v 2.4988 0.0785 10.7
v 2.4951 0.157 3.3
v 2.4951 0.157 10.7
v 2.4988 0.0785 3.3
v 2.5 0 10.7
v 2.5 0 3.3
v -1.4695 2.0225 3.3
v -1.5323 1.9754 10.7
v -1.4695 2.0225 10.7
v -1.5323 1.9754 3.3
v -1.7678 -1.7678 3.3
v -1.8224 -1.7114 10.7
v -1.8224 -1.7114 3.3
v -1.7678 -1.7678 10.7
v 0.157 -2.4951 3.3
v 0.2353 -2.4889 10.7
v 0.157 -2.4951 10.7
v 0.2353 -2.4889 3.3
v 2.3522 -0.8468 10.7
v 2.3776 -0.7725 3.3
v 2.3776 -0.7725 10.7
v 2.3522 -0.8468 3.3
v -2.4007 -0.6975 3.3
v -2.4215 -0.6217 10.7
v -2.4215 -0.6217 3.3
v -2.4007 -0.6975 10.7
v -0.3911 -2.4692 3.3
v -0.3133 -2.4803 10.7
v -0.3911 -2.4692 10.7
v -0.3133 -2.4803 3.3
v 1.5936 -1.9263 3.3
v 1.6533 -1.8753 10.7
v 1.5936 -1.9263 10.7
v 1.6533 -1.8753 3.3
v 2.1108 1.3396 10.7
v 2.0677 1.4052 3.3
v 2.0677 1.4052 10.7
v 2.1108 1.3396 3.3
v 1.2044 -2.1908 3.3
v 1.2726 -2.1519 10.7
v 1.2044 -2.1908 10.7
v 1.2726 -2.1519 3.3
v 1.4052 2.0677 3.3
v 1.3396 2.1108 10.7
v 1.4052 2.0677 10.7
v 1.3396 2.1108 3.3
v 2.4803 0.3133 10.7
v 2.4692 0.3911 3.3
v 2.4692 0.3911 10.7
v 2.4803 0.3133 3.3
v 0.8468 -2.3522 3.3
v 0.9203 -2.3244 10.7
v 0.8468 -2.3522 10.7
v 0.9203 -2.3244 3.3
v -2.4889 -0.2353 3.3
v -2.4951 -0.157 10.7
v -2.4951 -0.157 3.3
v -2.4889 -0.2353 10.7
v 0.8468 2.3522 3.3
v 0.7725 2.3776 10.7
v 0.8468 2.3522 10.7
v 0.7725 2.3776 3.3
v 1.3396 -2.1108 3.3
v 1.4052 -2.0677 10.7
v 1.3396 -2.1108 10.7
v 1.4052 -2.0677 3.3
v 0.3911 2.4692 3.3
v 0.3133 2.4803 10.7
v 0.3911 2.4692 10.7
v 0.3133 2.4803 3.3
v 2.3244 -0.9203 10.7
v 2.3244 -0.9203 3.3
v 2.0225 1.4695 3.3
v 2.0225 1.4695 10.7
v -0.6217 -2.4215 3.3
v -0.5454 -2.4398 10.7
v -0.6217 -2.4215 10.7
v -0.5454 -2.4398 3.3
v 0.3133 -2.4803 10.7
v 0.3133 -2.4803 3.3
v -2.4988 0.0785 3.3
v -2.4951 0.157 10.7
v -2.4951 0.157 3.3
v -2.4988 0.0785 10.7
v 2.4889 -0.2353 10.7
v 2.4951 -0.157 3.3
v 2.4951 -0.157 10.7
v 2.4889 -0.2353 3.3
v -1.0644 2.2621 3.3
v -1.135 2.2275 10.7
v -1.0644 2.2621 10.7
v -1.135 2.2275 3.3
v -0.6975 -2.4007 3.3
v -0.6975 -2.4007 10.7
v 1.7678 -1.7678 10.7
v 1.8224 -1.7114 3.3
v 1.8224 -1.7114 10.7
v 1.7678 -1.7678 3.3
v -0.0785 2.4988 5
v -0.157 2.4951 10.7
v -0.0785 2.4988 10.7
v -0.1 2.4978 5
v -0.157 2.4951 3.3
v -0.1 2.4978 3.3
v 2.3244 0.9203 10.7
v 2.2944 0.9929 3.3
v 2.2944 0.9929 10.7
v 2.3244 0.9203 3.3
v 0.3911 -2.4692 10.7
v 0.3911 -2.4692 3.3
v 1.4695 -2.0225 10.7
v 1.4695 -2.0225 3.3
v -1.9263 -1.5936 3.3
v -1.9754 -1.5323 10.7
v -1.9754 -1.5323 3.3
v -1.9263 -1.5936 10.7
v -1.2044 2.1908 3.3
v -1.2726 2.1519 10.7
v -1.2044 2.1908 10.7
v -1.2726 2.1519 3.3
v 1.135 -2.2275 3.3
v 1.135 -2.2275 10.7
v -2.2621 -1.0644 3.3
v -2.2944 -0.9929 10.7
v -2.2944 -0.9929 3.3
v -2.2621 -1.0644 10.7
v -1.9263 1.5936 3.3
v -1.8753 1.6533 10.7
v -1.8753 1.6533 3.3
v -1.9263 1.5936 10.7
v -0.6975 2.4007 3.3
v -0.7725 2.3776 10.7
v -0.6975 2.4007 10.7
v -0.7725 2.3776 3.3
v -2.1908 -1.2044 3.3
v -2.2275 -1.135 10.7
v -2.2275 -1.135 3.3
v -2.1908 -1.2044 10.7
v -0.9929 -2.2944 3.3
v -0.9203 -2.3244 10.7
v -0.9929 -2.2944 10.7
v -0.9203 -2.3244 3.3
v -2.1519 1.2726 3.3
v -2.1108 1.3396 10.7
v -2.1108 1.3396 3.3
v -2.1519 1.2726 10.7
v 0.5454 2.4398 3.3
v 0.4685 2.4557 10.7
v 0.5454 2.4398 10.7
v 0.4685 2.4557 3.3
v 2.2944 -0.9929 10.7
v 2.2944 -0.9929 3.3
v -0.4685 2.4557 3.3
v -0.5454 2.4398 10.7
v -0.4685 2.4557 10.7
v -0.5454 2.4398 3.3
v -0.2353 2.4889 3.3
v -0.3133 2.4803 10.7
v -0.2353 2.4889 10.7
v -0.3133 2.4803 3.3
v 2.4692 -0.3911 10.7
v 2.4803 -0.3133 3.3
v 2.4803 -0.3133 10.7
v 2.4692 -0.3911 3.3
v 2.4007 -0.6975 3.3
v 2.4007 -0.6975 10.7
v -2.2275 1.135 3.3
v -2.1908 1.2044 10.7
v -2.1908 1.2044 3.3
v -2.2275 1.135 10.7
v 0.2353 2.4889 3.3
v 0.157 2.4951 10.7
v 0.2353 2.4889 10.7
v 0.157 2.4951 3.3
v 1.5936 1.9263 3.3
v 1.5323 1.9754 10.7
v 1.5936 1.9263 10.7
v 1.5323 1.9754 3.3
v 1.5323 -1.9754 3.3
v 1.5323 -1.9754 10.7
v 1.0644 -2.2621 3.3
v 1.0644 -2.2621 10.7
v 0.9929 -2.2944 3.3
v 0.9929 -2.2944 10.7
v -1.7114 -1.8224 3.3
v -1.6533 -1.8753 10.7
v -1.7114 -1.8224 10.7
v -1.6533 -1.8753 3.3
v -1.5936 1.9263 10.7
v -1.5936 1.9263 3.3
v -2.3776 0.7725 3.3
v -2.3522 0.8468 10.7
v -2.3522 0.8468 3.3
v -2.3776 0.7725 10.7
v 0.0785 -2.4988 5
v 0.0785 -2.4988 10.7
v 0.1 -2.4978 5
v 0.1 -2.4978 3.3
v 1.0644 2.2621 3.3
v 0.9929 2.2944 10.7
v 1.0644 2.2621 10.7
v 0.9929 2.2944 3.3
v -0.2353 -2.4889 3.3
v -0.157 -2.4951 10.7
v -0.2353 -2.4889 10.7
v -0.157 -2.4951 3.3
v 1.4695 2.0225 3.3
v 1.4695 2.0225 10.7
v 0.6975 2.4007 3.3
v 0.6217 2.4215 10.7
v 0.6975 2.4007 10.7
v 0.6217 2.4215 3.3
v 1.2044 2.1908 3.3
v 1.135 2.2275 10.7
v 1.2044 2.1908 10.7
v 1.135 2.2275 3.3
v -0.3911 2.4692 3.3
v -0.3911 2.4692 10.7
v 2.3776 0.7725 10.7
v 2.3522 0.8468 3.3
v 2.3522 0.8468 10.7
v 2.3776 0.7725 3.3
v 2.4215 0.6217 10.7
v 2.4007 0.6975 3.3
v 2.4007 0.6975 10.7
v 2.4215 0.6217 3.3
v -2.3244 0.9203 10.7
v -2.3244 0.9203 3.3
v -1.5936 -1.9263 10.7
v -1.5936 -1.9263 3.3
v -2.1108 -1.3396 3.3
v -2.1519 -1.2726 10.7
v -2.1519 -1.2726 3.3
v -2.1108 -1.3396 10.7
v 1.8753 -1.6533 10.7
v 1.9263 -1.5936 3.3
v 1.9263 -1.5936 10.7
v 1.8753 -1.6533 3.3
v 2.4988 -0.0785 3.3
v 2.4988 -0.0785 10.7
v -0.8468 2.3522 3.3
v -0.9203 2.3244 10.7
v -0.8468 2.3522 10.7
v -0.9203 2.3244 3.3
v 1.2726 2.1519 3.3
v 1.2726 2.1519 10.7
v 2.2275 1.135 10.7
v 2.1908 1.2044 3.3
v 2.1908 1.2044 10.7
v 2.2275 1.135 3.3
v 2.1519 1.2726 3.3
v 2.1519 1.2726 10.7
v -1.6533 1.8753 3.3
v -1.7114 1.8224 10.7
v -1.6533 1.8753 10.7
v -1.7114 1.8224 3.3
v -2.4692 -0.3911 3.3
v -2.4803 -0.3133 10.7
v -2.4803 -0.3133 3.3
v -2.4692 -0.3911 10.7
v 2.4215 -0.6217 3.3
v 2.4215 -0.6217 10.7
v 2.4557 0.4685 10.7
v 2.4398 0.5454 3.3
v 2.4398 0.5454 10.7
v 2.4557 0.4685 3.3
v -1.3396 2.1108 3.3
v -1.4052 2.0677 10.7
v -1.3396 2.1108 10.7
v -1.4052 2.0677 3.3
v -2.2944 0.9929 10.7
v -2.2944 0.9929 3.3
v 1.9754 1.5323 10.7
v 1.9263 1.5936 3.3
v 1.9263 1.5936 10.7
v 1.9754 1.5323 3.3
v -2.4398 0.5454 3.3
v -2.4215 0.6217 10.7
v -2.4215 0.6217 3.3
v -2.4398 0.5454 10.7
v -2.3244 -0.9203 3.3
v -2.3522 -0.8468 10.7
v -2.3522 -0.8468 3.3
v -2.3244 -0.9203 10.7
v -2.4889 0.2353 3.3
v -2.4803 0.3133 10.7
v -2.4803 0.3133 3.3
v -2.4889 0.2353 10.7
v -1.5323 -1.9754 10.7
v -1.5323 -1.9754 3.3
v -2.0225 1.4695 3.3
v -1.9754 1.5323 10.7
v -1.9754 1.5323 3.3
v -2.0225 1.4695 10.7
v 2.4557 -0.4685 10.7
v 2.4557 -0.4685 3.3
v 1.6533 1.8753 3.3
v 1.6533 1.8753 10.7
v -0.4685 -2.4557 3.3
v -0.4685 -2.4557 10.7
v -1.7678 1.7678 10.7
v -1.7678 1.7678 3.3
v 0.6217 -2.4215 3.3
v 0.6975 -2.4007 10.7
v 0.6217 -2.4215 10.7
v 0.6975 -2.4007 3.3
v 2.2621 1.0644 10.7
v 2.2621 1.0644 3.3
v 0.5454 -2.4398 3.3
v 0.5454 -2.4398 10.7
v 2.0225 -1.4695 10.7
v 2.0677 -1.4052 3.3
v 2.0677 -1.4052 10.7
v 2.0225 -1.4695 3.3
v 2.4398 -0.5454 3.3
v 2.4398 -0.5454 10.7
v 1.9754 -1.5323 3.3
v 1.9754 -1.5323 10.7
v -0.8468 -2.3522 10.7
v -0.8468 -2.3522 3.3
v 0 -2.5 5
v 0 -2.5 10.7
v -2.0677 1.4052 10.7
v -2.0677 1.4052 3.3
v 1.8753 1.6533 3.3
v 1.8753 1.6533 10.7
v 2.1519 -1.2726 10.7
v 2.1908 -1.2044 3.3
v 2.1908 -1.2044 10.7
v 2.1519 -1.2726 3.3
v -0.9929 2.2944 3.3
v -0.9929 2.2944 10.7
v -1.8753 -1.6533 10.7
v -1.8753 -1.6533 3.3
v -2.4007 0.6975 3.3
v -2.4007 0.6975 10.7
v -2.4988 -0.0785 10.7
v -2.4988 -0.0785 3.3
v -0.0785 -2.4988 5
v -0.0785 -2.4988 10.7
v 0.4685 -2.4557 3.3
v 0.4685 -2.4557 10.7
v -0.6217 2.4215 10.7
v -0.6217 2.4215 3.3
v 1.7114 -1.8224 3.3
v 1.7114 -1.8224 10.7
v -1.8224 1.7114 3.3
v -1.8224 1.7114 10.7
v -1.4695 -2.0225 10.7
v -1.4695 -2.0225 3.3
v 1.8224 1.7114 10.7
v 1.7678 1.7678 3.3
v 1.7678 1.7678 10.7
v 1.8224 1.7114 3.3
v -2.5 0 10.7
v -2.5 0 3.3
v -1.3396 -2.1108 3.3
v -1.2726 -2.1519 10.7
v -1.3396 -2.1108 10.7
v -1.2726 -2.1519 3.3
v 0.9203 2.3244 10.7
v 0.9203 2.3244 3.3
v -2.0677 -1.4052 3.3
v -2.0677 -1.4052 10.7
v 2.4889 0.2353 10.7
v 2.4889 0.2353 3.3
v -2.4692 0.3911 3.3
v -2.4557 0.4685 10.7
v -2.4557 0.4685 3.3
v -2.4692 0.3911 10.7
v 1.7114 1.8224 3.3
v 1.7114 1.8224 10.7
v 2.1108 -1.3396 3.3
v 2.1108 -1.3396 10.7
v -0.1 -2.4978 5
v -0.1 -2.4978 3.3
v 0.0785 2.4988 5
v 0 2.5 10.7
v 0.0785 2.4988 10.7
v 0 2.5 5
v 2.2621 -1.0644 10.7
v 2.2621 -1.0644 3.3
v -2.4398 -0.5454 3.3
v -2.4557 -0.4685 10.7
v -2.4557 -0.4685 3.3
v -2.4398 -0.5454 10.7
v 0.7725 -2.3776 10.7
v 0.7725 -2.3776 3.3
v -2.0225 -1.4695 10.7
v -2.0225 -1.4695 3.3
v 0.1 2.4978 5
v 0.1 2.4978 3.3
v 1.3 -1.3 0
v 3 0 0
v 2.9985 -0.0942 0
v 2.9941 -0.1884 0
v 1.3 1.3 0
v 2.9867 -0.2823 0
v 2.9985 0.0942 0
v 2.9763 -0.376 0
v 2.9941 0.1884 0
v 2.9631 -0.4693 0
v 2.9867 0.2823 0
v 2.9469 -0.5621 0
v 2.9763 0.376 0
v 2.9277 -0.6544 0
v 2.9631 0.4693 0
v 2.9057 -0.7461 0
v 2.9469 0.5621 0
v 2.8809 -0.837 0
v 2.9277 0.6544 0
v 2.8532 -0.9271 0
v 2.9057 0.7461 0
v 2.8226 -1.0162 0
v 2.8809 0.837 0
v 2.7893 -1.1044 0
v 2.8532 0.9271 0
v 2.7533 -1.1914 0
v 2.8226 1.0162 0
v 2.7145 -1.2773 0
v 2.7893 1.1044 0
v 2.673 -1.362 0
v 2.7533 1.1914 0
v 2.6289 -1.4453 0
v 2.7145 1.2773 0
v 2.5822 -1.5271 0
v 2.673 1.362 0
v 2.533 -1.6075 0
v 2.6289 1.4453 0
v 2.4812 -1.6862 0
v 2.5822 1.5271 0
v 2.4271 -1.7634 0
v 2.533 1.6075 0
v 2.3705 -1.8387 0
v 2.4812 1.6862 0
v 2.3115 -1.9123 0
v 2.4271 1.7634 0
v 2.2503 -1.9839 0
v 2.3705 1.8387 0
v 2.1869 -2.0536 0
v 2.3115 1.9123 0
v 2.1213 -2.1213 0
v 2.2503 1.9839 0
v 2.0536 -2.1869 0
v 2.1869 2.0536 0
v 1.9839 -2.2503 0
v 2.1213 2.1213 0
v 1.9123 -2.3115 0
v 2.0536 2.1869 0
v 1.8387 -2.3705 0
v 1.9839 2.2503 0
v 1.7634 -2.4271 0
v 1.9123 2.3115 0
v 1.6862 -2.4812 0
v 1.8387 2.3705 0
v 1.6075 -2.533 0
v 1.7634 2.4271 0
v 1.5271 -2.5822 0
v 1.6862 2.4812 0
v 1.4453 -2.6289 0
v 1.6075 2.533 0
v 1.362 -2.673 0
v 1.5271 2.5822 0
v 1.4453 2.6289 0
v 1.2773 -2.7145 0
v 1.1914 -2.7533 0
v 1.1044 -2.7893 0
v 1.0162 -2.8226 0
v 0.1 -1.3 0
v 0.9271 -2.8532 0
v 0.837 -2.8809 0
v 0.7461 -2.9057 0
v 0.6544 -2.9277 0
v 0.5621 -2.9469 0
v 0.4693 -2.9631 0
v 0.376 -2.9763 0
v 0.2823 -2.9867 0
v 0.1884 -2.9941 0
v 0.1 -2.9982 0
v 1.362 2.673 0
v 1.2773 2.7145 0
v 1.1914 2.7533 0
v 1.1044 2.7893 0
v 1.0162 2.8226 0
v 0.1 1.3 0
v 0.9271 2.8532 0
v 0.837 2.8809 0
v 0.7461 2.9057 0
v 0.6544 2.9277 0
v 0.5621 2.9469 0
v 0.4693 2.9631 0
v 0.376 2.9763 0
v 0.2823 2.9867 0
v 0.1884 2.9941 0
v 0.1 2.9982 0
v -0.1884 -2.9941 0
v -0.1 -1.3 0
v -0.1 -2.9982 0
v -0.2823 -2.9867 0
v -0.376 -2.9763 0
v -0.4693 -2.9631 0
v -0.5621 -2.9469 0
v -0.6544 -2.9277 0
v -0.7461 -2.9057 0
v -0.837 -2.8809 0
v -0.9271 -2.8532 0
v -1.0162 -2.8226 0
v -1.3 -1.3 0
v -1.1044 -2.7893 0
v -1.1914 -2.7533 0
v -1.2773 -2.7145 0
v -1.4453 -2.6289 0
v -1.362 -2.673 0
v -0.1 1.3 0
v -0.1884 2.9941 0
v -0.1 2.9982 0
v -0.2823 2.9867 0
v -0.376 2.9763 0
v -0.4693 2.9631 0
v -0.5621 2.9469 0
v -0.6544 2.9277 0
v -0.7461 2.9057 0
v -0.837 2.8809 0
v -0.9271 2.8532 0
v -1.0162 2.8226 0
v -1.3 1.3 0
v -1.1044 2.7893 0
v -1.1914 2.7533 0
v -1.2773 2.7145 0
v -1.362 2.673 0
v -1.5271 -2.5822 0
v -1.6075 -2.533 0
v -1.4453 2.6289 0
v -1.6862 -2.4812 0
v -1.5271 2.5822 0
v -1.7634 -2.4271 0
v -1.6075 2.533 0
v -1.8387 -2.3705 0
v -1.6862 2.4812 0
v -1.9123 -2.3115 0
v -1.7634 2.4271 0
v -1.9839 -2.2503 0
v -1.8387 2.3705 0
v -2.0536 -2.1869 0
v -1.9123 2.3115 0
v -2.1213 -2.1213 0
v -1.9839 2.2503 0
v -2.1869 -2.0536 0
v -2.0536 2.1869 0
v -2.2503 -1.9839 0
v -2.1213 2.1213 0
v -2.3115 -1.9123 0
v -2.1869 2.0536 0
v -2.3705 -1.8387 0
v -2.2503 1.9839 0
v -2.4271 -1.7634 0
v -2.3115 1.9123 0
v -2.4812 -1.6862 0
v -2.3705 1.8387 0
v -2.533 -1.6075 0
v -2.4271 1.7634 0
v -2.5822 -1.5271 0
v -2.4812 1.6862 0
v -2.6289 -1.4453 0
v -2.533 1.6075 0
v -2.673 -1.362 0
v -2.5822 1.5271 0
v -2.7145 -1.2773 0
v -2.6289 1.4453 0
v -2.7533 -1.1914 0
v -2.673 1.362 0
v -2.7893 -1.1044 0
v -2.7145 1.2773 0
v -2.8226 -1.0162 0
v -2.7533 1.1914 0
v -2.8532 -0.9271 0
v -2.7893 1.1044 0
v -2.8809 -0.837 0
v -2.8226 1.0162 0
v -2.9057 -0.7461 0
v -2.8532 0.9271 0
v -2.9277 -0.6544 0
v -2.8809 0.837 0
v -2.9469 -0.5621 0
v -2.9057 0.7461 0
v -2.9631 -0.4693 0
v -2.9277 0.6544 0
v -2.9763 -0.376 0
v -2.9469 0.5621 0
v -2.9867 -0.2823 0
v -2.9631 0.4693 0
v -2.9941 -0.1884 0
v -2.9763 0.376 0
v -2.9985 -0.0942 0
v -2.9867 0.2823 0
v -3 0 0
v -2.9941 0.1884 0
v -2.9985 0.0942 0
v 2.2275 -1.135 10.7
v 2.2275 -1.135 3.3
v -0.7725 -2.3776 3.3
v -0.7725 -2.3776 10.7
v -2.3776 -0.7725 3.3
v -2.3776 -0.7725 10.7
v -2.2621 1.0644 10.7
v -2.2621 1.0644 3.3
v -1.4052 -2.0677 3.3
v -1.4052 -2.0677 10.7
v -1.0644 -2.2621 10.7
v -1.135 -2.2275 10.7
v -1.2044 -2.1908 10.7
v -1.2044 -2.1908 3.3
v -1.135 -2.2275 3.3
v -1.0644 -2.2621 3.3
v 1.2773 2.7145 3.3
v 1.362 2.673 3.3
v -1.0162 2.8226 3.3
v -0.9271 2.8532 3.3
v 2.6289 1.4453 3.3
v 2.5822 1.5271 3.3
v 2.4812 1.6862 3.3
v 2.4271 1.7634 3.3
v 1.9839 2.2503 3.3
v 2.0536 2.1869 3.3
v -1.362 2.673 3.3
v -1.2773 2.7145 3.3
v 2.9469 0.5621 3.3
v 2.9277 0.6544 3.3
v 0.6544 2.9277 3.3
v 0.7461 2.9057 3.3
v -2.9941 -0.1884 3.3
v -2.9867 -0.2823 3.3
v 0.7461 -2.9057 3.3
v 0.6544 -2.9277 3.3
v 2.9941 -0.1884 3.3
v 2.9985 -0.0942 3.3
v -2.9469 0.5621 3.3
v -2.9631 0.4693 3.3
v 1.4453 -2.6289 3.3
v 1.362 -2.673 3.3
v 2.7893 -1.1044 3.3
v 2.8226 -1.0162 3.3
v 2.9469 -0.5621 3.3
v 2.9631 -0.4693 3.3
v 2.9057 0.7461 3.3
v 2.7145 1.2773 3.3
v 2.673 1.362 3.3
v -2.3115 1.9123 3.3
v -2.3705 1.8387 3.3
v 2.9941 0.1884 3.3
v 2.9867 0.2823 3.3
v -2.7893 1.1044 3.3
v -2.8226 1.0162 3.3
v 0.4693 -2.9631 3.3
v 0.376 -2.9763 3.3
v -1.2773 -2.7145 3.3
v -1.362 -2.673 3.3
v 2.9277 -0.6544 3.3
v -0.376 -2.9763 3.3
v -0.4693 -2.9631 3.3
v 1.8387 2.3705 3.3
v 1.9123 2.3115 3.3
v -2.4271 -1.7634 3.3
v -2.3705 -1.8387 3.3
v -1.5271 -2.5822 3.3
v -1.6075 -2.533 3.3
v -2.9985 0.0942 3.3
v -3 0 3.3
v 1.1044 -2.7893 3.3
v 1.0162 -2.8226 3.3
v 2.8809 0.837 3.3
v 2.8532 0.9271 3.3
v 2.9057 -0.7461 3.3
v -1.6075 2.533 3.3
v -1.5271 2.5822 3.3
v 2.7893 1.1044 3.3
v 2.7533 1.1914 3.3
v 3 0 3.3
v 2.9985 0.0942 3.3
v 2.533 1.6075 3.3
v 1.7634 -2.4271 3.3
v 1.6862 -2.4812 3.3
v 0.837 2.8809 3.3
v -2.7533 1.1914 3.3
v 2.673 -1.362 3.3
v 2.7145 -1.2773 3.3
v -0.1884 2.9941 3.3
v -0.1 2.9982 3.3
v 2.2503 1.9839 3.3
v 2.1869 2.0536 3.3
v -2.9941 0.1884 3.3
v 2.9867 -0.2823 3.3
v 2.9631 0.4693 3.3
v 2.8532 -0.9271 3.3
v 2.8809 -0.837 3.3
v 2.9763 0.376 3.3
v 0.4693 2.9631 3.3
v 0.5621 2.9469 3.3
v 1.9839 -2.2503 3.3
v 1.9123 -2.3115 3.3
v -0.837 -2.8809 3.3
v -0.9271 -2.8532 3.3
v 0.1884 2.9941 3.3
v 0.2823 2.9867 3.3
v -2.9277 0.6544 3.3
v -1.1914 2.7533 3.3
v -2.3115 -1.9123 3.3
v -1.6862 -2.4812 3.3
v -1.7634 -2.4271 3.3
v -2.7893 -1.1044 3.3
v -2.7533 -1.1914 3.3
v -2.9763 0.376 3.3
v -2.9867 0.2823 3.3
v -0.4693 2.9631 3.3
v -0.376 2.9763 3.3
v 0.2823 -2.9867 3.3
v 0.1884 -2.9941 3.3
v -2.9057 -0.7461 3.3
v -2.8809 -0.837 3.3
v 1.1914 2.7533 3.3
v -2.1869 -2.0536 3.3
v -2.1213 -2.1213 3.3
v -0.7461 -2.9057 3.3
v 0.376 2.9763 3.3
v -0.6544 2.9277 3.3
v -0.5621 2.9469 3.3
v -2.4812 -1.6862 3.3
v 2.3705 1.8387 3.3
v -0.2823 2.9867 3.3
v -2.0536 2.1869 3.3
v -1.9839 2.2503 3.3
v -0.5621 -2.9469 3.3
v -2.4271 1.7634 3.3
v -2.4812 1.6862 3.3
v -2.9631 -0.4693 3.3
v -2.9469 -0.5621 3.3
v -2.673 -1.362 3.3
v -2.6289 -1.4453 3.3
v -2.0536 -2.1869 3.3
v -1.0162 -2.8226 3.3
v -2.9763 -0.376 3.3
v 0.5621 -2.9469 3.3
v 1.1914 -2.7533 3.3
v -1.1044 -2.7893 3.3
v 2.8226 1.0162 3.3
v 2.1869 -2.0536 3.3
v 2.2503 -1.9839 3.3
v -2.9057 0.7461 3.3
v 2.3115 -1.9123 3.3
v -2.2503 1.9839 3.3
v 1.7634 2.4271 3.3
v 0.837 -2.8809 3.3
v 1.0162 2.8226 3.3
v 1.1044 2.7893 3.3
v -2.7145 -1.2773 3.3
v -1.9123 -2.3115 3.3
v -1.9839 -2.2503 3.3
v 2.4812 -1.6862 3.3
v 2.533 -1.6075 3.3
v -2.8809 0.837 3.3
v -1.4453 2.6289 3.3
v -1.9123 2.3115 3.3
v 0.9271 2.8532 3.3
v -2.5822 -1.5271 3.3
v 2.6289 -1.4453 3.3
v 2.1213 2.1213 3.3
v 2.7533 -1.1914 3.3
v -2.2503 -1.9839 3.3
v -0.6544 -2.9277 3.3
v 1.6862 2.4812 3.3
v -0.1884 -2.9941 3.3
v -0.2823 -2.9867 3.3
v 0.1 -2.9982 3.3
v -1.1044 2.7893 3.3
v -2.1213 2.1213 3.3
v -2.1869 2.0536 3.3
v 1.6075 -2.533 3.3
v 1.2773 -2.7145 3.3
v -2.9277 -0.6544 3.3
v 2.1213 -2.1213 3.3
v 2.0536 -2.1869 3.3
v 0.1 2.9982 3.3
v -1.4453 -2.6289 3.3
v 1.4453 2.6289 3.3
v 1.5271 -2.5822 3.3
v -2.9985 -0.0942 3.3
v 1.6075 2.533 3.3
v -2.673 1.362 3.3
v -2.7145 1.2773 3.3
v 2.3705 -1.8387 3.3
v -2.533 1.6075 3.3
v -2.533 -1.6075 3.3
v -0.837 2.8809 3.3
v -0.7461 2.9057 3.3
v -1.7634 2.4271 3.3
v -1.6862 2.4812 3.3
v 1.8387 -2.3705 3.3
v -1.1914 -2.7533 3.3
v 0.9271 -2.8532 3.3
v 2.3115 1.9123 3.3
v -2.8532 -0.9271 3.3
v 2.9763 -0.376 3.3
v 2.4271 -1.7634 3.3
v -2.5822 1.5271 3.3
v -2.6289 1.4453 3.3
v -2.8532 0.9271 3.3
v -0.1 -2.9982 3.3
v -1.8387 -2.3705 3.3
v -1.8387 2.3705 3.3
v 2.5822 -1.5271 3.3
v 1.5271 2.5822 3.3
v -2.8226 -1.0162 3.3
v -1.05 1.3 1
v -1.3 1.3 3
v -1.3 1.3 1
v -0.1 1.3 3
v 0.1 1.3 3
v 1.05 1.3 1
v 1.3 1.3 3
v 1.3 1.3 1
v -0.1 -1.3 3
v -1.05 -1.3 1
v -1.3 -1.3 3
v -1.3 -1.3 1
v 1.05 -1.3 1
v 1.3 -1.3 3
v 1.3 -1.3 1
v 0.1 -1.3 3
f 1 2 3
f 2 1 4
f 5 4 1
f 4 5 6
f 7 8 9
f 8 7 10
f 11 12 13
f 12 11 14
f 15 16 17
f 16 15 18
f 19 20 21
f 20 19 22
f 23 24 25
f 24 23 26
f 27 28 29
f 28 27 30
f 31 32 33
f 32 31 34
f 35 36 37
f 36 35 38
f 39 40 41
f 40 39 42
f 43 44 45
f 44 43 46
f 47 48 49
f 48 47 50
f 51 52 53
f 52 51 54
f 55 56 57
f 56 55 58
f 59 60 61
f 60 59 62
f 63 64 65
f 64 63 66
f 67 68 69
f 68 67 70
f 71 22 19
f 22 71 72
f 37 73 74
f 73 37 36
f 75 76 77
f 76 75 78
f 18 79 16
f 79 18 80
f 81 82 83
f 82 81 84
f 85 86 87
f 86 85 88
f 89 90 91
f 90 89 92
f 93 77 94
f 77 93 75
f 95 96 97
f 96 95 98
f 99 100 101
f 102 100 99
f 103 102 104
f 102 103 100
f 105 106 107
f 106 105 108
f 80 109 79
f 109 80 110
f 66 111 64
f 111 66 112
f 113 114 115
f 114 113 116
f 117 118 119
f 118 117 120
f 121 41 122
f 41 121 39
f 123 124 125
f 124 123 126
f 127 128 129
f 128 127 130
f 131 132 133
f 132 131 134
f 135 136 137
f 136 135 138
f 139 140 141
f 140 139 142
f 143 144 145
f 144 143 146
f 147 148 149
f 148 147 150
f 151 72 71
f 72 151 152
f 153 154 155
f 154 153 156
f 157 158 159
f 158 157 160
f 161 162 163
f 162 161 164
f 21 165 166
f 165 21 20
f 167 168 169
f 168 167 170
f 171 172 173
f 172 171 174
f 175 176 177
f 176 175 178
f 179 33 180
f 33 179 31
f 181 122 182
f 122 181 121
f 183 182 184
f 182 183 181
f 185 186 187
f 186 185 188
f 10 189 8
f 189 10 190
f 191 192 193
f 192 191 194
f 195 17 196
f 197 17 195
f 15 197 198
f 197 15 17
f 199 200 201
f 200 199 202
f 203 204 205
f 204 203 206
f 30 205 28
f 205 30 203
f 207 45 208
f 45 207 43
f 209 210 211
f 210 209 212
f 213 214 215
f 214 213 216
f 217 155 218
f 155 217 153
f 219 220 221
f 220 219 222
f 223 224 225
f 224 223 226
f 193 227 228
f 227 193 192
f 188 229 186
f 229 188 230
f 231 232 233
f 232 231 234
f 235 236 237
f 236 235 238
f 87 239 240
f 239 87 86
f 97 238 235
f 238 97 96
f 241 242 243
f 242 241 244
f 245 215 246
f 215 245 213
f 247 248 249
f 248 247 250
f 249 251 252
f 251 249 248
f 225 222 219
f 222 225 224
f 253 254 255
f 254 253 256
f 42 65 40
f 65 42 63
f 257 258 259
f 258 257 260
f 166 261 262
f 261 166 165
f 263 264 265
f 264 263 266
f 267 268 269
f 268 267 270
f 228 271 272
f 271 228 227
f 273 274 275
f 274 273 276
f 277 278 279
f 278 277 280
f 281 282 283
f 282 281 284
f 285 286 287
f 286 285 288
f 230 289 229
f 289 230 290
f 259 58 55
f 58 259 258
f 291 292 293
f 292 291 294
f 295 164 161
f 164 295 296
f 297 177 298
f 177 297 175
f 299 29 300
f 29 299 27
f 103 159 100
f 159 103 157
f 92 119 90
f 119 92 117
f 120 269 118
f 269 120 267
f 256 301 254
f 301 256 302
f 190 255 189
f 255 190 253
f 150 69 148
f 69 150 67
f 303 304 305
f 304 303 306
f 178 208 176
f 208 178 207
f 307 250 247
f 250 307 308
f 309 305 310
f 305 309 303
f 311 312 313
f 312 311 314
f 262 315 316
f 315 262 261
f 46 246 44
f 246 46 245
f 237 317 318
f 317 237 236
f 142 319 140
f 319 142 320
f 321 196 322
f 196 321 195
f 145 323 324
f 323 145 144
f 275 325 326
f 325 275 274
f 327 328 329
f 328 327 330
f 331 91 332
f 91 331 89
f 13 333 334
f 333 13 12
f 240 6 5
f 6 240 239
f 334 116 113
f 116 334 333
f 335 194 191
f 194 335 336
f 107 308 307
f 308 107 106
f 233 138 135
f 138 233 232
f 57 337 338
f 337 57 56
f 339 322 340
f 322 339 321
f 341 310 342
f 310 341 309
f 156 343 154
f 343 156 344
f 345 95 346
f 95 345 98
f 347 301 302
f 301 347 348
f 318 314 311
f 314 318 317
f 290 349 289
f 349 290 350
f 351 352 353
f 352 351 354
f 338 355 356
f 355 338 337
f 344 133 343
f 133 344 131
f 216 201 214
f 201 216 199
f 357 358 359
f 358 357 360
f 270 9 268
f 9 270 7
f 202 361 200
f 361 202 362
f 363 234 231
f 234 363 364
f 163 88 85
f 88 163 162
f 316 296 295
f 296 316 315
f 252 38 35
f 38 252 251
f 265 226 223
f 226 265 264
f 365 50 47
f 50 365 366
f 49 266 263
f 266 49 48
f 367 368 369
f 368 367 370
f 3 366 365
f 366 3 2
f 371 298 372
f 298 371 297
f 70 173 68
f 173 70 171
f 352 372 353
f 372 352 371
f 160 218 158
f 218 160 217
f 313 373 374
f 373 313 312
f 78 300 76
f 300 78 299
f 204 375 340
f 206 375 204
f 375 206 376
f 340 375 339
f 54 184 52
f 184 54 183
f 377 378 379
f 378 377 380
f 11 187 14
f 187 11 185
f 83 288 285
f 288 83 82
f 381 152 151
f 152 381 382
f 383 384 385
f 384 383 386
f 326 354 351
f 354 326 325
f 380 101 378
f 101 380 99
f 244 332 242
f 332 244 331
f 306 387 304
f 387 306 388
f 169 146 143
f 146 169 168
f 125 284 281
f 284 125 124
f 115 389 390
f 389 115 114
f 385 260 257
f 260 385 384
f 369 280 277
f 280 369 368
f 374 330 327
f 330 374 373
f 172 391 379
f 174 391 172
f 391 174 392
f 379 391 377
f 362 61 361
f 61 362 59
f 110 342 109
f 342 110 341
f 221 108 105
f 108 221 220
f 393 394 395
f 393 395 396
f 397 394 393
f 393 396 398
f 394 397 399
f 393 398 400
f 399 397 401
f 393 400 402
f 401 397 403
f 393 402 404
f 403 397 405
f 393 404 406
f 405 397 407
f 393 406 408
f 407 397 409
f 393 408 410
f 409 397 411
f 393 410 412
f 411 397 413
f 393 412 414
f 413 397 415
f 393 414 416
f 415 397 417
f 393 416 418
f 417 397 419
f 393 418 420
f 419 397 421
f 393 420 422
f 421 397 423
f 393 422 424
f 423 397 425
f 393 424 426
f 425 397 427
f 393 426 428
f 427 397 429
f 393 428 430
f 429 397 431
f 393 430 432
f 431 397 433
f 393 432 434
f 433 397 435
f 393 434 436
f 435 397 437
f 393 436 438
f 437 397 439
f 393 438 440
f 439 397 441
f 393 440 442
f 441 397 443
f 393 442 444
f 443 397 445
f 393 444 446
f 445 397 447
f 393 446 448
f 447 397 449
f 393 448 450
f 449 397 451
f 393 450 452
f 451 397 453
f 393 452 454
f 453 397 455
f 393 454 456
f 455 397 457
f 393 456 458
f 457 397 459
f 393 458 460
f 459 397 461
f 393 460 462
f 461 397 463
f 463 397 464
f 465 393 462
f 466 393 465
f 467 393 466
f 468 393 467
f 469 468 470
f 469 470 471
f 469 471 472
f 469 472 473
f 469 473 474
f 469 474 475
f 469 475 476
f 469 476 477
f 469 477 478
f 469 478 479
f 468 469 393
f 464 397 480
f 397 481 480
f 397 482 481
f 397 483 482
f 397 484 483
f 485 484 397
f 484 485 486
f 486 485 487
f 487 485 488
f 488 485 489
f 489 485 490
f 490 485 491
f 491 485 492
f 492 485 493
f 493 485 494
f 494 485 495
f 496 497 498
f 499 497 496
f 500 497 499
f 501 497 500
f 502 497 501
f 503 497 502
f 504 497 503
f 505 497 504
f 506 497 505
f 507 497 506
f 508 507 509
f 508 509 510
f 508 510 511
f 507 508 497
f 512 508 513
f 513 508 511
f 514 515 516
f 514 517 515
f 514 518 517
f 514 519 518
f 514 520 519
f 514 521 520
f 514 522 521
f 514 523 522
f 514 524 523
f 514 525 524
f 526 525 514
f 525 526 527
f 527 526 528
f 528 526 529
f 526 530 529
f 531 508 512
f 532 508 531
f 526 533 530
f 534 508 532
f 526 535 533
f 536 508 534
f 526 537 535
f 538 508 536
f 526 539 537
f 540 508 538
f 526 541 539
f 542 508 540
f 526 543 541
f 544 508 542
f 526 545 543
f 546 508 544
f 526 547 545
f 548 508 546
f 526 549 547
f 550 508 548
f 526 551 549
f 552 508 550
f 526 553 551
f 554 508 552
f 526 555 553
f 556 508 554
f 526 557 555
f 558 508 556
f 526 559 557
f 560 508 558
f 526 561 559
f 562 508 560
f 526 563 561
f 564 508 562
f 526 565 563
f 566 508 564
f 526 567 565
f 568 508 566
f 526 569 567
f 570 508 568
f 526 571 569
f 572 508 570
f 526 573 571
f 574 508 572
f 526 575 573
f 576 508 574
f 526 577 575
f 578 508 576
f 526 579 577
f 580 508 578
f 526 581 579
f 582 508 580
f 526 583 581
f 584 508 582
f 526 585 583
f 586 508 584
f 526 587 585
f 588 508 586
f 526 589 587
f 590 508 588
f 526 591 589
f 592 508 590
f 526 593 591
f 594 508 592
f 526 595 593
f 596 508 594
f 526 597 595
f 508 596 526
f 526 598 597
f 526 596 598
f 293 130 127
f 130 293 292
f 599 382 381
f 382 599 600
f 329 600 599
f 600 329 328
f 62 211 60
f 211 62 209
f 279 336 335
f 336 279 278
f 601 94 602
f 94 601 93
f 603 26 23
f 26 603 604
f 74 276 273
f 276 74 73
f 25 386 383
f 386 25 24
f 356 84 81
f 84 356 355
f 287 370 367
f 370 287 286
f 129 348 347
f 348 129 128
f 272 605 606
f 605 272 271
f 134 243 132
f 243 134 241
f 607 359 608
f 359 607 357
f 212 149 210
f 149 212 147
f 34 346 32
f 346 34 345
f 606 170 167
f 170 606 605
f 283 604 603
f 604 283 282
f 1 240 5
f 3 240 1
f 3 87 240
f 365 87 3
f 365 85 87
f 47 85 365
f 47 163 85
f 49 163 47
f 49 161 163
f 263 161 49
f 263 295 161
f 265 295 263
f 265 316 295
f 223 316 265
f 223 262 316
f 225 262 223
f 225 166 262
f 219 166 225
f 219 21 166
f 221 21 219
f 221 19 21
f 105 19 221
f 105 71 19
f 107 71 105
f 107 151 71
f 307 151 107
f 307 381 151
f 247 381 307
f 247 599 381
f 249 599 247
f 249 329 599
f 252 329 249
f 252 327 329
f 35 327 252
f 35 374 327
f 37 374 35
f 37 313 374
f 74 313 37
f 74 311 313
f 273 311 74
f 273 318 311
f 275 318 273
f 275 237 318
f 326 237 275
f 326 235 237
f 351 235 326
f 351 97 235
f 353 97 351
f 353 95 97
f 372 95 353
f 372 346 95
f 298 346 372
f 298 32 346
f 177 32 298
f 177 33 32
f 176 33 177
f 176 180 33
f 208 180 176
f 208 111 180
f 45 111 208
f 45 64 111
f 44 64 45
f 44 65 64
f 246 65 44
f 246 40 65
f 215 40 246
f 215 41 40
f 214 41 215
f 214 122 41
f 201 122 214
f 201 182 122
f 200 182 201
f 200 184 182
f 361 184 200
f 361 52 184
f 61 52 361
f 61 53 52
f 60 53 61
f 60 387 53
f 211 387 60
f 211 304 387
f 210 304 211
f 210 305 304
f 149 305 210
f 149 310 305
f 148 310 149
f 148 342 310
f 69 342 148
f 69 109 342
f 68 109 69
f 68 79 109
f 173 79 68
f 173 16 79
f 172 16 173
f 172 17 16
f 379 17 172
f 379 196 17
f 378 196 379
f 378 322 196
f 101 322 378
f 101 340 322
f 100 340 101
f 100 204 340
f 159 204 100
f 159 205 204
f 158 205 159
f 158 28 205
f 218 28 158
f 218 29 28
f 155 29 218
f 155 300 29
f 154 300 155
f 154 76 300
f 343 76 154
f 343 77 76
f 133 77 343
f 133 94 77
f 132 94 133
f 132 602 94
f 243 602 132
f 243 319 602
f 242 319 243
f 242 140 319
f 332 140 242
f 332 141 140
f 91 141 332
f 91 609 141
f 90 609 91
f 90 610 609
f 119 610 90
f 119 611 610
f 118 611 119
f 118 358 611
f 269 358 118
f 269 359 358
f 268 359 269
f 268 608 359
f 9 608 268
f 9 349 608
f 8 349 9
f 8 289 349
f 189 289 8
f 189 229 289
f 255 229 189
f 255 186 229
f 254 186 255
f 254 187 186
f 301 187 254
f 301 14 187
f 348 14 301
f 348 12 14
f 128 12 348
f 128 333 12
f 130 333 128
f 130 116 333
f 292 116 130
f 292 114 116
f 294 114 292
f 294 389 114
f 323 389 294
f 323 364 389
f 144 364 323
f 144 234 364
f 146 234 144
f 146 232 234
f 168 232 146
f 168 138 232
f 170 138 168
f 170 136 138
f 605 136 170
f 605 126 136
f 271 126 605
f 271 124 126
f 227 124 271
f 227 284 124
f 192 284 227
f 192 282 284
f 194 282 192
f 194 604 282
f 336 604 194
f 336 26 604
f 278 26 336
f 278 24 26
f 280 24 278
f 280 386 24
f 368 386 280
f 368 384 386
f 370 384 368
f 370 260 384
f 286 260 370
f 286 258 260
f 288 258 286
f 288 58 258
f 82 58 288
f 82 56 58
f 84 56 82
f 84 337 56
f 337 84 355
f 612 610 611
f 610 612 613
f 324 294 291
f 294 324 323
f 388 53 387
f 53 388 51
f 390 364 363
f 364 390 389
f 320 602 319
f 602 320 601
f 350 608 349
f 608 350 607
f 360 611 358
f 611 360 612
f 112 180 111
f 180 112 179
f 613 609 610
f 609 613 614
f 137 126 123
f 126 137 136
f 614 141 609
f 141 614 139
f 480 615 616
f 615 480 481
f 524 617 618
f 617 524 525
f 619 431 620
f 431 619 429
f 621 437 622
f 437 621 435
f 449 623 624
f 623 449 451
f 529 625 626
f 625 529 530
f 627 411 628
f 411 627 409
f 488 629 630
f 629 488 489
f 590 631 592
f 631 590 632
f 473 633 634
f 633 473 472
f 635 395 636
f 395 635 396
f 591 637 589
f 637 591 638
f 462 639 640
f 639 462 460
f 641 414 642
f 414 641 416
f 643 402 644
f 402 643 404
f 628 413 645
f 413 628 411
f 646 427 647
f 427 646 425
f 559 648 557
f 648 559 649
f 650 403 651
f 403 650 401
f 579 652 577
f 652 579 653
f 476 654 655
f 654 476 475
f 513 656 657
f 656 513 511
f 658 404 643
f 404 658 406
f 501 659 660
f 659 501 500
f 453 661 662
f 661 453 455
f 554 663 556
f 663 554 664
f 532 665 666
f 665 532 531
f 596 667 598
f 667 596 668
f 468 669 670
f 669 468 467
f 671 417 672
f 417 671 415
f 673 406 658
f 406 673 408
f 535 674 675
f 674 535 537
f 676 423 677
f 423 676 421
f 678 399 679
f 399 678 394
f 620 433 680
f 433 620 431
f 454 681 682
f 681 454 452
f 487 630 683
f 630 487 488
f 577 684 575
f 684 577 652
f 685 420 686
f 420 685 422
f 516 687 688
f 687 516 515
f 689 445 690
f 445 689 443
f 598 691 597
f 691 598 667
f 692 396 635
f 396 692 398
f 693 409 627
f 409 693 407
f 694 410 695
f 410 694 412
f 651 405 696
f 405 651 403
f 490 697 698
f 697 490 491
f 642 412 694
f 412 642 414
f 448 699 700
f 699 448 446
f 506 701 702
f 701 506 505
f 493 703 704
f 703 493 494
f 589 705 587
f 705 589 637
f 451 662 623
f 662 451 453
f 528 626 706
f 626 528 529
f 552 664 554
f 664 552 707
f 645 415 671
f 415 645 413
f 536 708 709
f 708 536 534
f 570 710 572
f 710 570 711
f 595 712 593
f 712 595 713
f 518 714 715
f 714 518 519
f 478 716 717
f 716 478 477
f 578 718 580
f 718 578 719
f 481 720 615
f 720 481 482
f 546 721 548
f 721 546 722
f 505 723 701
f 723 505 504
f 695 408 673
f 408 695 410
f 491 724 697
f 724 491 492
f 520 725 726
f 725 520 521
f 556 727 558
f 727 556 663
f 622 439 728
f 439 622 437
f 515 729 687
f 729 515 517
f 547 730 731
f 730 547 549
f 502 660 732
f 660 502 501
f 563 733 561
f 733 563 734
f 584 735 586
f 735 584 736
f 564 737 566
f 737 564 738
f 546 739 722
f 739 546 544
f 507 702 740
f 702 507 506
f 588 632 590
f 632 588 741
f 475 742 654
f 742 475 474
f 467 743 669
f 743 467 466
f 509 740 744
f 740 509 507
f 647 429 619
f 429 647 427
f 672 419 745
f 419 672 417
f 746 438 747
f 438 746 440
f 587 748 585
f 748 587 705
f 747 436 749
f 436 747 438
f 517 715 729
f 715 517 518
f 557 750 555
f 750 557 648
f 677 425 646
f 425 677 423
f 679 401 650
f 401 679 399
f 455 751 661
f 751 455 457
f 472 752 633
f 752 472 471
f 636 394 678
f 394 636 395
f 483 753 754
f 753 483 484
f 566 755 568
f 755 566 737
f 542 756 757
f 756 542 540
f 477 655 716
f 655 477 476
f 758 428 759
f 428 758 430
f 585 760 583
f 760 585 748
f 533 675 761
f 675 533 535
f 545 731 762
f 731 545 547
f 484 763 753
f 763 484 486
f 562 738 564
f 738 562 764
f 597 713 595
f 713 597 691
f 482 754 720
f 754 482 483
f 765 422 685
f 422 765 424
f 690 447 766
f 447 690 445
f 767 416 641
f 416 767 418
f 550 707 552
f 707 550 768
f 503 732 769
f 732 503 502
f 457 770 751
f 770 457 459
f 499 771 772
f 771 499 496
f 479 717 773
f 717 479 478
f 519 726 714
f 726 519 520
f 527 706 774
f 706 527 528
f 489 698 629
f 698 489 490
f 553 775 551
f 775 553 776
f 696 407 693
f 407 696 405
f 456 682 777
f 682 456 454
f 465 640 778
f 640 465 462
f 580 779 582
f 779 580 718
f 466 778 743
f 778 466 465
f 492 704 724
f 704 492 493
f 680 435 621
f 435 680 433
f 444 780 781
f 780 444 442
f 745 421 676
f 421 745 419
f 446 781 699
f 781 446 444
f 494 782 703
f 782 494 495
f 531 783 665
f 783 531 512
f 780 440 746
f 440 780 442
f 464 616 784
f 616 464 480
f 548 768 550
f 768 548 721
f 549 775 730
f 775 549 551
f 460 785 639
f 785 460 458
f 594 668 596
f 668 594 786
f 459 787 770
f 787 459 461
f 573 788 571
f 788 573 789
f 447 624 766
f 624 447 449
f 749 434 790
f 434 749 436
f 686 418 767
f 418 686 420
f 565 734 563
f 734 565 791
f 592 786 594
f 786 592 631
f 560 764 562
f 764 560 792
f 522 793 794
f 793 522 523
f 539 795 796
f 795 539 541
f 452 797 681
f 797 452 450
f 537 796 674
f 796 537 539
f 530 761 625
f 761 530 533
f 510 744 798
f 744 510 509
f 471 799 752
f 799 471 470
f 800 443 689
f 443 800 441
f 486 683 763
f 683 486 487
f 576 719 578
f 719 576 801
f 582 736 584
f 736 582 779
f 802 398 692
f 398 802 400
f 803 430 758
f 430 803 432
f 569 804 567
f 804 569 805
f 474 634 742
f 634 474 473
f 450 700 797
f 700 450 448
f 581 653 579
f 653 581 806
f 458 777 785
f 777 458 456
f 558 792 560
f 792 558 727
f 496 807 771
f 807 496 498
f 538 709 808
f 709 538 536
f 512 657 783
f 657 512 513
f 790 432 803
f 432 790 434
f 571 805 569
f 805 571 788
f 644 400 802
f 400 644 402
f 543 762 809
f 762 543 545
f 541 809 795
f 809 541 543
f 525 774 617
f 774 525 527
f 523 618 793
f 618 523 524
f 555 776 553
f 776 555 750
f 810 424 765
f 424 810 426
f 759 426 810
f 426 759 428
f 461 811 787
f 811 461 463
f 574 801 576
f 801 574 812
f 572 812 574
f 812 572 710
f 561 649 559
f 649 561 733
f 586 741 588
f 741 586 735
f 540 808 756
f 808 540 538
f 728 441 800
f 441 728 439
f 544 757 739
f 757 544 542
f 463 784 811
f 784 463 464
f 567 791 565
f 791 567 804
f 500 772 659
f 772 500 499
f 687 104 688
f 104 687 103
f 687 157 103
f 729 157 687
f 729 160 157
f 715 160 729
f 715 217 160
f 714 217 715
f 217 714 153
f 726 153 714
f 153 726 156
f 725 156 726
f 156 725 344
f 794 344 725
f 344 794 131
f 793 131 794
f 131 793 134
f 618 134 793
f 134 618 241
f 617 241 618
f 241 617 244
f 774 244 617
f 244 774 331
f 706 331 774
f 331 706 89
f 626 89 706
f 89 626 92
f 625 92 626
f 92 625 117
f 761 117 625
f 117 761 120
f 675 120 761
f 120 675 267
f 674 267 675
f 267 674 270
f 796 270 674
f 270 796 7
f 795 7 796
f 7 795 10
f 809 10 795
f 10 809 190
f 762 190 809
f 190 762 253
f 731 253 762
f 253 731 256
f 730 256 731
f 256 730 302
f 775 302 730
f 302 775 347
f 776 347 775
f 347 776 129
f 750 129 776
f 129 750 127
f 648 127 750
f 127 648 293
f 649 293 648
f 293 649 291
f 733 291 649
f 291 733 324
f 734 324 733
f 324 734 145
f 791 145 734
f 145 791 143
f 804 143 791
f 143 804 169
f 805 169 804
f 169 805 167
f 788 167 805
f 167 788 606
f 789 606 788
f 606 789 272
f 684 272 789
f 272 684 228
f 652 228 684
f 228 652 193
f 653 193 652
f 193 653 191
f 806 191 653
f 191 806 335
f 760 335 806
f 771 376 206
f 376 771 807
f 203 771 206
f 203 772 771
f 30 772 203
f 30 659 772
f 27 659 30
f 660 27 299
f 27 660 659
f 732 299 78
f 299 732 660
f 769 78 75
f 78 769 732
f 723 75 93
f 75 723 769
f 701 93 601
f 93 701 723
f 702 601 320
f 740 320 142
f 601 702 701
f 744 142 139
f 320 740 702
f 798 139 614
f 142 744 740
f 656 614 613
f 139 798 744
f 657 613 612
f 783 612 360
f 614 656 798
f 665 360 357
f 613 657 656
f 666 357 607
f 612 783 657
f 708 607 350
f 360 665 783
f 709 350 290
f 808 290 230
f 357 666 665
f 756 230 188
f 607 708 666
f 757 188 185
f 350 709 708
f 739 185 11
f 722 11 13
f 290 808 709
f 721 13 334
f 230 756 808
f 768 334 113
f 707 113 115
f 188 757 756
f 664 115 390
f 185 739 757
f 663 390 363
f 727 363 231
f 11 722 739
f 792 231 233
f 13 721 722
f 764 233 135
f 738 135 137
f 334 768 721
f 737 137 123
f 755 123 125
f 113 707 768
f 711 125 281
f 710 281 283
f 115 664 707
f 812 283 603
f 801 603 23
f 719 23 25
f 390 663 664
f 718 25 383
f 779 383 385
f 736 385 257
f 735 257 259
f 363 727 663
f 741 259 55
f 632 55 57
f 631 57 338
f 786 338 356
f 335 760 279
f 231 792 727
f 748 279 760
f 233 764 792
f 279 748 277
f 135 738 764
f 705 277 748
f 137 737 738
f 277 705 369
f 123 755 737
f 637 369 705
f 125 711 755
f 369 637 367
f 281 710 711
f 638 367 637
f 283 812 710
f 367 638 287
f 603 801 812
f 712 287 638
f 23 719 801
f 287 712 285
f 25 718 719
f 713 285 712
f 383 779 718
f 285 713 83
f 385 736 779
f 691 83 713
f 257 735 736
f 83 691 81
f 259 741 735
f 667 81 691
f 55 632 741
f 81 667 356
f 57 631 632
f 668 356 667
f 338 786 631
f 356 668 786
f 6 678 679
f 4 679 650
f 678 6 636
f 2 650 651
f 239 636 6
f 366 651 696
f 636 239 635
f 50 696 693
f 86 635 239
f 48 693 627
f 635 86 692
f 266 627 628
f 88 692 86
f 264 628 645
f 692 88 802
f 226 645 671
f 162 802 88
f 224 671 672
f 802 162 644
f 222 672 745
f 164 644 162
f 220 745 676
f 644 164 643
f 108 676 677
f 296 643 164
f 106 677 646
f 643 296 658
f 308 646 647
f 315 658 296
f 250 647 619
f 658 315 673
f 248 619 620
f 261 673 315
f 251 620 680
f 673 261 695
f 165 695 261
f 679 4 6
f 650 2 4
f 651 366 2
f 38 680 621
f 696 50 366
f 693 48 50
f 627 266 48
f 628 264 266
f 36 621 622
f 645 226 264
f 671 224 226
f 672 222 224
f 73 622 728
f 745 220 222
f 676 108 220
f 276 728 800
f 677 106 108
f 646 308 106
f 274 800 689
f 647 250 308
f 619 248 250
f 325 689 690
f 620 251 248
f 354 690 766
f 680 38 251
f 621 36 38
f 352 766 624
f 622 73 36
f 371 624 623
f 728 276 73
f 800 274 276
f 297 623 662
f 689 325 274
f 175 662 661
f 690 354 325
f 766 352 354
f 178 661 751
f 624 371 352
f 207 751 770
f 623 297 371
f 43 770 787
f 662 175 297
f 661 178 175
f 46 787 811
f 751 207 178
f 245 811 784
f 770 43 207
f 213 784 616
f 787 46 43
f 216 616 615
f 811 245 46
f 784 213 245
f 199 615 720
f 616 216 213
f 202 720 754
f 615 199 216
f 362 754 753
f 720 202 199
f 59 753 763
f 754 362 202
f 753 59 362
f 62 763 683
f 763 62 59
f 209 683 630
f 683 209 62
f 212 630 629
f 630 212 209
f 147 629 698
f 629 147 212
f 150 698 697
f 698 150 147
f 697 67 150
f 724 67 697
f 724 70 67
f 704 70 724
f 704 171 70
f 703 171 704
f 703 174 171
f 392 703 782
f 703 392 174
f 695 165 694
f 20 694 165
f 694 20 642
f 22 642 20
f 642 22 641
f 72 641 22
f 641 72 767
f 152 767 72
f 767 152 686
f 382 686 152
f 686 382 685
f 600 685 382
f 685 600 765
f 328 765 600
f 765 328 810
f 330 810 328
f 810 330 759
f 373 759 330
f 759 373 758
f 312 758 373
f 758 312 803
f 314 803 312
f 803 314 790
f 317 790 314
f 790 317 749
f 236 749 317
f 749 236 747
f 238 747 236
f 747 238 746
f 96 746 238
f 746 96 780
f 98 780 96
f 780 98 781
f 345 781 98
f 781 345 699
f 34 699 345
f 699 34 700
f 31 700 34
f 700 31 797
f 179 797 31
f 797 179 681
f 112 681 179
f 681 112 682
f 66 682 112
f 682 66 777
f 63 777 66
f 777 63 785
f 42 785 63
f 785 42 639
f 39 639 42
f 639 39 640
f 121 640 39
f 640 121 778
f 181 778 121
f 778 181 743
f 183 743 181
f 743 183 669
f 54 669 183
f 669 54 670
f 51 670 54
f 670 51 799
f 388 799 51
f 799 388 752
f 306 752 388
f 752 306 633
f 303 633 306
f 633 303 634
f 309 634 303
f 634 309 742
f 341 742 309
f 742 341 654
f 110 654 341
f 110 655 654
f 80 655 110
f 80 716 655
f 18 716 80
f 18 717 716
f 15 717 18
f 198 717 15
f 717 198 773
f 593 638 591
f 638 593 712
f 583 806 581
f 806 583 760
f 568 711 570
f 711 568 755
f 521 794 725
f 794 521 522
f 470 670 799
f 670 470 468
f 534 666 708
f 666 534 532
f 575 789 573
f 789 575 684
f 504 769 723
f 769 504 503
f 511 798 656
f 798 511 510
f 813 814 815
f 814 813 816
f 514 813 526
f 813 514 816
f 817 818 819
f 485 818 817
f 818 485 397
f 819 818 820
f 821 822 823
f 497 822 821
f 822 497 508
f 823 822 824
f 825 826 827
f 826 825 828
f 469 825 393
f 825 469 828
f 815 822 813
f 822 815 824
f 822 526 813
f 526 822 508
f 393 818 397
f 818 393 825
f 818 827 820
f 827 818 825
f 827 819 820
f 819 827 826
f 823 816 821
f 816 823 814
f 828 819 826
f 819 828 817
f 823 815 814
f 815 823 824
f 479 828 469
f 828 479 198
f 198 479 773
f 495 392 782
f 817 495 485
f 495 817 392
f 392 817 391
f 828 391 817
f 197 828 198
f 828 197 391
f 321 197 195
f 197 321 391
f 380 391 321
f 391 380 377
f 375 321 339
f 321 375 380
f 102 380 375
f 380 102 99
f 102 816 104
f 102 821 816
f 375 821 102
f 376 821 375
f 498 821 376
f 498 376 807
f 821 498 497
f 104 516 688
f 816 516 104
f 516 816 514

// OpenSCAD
// file: helpers.scad
// centered on XY only
module cube_(size=[1, 1, 1])
	translate([-size[0] / 2, -size[1] / 2, 0])
		cube(size);

// centered on XY only
module roundedcubez(size = [1, 1, 1], radius = 0.5) {
	linear_extrude(height=size[2]) {
		square([size[0] - 2 * radius, size[1]], center=true);
		square([size[0], size[1] - 2 * radius], center=true);
		for (i=[-1, 1])
			for (j=[-1, 1])
				translate([i * (size[0] / 2 - radius), j * (size[1] / 2 - radius), 0])
					circle(r = radius);
	}
}
// main file
$fn = $preview ? 30 : 200;

include <helpers.scad>

gap = 0.2;

w_head = 2.4 + gap;
w_clip = w_head - 0.5;

h_clip = 1.0;  // height of the hook shaped clip
h_head = 1.8 + gap;  // height of the cube head of the button
h_stamp = h_clip + h_head;  // total height of the negative area

h_button = 8 + 7; // total height of the button measured from the _PCB_
h_cap = h_stamp + h_button - 7.3;
echo(h_cap);

module half_stamp() {
	polygon(points=[
		[0, 0],
		[-w_head / 2, 0],
		[-w_clip / 2, h_clip],
		[-w_head / 2, h_clip],
		[-w_head / 2, h_stamp],
		[0, h_stamp],
	]);
}

// half_stamp();

module stamp() {
	translate([0, w_head / 2, 0])
		rotate([90, 0, 0])
			linear_extrude(w_head)
				union() {
					half_stamp();
					mirror([1, 0, 0]) half_stamp();
				}
}

module cap(){
	difference() {
		union() {
			cylinder(h=h_cap, d=5);
			// larger diameter for the inside part
			cylinder(h=h_stamp + 8 - 7.3 - 2 * gap, d=6);
		}
		stamp();
		// the slot
		cube(size=[gap, 10, 10], center=true);
		// chamfer the edges on the top
		translate([0, 0, h_cap - 5.25])
			cone();
	}
}

module cone()
	rotate_extrude()
		translate([5 * sqrt(2), 0, 0])
			rotate([0, 0, 45])
				square([10, 10]);


// simulate the switch head
// translate([0, 0, 7.3 - 1.8])
// 	cube_(size=[2.4, 2.4, 1.8]);

echo("button z", -h_stamp + 7.3 + gap / 2);

intersection() {
	translate([0, 0, -h_stamp + 7.3 + gap / 2])
		!cap();
	translate([0, 50, 0])
		cube(size=[100, 100, 100], center=true);
}
